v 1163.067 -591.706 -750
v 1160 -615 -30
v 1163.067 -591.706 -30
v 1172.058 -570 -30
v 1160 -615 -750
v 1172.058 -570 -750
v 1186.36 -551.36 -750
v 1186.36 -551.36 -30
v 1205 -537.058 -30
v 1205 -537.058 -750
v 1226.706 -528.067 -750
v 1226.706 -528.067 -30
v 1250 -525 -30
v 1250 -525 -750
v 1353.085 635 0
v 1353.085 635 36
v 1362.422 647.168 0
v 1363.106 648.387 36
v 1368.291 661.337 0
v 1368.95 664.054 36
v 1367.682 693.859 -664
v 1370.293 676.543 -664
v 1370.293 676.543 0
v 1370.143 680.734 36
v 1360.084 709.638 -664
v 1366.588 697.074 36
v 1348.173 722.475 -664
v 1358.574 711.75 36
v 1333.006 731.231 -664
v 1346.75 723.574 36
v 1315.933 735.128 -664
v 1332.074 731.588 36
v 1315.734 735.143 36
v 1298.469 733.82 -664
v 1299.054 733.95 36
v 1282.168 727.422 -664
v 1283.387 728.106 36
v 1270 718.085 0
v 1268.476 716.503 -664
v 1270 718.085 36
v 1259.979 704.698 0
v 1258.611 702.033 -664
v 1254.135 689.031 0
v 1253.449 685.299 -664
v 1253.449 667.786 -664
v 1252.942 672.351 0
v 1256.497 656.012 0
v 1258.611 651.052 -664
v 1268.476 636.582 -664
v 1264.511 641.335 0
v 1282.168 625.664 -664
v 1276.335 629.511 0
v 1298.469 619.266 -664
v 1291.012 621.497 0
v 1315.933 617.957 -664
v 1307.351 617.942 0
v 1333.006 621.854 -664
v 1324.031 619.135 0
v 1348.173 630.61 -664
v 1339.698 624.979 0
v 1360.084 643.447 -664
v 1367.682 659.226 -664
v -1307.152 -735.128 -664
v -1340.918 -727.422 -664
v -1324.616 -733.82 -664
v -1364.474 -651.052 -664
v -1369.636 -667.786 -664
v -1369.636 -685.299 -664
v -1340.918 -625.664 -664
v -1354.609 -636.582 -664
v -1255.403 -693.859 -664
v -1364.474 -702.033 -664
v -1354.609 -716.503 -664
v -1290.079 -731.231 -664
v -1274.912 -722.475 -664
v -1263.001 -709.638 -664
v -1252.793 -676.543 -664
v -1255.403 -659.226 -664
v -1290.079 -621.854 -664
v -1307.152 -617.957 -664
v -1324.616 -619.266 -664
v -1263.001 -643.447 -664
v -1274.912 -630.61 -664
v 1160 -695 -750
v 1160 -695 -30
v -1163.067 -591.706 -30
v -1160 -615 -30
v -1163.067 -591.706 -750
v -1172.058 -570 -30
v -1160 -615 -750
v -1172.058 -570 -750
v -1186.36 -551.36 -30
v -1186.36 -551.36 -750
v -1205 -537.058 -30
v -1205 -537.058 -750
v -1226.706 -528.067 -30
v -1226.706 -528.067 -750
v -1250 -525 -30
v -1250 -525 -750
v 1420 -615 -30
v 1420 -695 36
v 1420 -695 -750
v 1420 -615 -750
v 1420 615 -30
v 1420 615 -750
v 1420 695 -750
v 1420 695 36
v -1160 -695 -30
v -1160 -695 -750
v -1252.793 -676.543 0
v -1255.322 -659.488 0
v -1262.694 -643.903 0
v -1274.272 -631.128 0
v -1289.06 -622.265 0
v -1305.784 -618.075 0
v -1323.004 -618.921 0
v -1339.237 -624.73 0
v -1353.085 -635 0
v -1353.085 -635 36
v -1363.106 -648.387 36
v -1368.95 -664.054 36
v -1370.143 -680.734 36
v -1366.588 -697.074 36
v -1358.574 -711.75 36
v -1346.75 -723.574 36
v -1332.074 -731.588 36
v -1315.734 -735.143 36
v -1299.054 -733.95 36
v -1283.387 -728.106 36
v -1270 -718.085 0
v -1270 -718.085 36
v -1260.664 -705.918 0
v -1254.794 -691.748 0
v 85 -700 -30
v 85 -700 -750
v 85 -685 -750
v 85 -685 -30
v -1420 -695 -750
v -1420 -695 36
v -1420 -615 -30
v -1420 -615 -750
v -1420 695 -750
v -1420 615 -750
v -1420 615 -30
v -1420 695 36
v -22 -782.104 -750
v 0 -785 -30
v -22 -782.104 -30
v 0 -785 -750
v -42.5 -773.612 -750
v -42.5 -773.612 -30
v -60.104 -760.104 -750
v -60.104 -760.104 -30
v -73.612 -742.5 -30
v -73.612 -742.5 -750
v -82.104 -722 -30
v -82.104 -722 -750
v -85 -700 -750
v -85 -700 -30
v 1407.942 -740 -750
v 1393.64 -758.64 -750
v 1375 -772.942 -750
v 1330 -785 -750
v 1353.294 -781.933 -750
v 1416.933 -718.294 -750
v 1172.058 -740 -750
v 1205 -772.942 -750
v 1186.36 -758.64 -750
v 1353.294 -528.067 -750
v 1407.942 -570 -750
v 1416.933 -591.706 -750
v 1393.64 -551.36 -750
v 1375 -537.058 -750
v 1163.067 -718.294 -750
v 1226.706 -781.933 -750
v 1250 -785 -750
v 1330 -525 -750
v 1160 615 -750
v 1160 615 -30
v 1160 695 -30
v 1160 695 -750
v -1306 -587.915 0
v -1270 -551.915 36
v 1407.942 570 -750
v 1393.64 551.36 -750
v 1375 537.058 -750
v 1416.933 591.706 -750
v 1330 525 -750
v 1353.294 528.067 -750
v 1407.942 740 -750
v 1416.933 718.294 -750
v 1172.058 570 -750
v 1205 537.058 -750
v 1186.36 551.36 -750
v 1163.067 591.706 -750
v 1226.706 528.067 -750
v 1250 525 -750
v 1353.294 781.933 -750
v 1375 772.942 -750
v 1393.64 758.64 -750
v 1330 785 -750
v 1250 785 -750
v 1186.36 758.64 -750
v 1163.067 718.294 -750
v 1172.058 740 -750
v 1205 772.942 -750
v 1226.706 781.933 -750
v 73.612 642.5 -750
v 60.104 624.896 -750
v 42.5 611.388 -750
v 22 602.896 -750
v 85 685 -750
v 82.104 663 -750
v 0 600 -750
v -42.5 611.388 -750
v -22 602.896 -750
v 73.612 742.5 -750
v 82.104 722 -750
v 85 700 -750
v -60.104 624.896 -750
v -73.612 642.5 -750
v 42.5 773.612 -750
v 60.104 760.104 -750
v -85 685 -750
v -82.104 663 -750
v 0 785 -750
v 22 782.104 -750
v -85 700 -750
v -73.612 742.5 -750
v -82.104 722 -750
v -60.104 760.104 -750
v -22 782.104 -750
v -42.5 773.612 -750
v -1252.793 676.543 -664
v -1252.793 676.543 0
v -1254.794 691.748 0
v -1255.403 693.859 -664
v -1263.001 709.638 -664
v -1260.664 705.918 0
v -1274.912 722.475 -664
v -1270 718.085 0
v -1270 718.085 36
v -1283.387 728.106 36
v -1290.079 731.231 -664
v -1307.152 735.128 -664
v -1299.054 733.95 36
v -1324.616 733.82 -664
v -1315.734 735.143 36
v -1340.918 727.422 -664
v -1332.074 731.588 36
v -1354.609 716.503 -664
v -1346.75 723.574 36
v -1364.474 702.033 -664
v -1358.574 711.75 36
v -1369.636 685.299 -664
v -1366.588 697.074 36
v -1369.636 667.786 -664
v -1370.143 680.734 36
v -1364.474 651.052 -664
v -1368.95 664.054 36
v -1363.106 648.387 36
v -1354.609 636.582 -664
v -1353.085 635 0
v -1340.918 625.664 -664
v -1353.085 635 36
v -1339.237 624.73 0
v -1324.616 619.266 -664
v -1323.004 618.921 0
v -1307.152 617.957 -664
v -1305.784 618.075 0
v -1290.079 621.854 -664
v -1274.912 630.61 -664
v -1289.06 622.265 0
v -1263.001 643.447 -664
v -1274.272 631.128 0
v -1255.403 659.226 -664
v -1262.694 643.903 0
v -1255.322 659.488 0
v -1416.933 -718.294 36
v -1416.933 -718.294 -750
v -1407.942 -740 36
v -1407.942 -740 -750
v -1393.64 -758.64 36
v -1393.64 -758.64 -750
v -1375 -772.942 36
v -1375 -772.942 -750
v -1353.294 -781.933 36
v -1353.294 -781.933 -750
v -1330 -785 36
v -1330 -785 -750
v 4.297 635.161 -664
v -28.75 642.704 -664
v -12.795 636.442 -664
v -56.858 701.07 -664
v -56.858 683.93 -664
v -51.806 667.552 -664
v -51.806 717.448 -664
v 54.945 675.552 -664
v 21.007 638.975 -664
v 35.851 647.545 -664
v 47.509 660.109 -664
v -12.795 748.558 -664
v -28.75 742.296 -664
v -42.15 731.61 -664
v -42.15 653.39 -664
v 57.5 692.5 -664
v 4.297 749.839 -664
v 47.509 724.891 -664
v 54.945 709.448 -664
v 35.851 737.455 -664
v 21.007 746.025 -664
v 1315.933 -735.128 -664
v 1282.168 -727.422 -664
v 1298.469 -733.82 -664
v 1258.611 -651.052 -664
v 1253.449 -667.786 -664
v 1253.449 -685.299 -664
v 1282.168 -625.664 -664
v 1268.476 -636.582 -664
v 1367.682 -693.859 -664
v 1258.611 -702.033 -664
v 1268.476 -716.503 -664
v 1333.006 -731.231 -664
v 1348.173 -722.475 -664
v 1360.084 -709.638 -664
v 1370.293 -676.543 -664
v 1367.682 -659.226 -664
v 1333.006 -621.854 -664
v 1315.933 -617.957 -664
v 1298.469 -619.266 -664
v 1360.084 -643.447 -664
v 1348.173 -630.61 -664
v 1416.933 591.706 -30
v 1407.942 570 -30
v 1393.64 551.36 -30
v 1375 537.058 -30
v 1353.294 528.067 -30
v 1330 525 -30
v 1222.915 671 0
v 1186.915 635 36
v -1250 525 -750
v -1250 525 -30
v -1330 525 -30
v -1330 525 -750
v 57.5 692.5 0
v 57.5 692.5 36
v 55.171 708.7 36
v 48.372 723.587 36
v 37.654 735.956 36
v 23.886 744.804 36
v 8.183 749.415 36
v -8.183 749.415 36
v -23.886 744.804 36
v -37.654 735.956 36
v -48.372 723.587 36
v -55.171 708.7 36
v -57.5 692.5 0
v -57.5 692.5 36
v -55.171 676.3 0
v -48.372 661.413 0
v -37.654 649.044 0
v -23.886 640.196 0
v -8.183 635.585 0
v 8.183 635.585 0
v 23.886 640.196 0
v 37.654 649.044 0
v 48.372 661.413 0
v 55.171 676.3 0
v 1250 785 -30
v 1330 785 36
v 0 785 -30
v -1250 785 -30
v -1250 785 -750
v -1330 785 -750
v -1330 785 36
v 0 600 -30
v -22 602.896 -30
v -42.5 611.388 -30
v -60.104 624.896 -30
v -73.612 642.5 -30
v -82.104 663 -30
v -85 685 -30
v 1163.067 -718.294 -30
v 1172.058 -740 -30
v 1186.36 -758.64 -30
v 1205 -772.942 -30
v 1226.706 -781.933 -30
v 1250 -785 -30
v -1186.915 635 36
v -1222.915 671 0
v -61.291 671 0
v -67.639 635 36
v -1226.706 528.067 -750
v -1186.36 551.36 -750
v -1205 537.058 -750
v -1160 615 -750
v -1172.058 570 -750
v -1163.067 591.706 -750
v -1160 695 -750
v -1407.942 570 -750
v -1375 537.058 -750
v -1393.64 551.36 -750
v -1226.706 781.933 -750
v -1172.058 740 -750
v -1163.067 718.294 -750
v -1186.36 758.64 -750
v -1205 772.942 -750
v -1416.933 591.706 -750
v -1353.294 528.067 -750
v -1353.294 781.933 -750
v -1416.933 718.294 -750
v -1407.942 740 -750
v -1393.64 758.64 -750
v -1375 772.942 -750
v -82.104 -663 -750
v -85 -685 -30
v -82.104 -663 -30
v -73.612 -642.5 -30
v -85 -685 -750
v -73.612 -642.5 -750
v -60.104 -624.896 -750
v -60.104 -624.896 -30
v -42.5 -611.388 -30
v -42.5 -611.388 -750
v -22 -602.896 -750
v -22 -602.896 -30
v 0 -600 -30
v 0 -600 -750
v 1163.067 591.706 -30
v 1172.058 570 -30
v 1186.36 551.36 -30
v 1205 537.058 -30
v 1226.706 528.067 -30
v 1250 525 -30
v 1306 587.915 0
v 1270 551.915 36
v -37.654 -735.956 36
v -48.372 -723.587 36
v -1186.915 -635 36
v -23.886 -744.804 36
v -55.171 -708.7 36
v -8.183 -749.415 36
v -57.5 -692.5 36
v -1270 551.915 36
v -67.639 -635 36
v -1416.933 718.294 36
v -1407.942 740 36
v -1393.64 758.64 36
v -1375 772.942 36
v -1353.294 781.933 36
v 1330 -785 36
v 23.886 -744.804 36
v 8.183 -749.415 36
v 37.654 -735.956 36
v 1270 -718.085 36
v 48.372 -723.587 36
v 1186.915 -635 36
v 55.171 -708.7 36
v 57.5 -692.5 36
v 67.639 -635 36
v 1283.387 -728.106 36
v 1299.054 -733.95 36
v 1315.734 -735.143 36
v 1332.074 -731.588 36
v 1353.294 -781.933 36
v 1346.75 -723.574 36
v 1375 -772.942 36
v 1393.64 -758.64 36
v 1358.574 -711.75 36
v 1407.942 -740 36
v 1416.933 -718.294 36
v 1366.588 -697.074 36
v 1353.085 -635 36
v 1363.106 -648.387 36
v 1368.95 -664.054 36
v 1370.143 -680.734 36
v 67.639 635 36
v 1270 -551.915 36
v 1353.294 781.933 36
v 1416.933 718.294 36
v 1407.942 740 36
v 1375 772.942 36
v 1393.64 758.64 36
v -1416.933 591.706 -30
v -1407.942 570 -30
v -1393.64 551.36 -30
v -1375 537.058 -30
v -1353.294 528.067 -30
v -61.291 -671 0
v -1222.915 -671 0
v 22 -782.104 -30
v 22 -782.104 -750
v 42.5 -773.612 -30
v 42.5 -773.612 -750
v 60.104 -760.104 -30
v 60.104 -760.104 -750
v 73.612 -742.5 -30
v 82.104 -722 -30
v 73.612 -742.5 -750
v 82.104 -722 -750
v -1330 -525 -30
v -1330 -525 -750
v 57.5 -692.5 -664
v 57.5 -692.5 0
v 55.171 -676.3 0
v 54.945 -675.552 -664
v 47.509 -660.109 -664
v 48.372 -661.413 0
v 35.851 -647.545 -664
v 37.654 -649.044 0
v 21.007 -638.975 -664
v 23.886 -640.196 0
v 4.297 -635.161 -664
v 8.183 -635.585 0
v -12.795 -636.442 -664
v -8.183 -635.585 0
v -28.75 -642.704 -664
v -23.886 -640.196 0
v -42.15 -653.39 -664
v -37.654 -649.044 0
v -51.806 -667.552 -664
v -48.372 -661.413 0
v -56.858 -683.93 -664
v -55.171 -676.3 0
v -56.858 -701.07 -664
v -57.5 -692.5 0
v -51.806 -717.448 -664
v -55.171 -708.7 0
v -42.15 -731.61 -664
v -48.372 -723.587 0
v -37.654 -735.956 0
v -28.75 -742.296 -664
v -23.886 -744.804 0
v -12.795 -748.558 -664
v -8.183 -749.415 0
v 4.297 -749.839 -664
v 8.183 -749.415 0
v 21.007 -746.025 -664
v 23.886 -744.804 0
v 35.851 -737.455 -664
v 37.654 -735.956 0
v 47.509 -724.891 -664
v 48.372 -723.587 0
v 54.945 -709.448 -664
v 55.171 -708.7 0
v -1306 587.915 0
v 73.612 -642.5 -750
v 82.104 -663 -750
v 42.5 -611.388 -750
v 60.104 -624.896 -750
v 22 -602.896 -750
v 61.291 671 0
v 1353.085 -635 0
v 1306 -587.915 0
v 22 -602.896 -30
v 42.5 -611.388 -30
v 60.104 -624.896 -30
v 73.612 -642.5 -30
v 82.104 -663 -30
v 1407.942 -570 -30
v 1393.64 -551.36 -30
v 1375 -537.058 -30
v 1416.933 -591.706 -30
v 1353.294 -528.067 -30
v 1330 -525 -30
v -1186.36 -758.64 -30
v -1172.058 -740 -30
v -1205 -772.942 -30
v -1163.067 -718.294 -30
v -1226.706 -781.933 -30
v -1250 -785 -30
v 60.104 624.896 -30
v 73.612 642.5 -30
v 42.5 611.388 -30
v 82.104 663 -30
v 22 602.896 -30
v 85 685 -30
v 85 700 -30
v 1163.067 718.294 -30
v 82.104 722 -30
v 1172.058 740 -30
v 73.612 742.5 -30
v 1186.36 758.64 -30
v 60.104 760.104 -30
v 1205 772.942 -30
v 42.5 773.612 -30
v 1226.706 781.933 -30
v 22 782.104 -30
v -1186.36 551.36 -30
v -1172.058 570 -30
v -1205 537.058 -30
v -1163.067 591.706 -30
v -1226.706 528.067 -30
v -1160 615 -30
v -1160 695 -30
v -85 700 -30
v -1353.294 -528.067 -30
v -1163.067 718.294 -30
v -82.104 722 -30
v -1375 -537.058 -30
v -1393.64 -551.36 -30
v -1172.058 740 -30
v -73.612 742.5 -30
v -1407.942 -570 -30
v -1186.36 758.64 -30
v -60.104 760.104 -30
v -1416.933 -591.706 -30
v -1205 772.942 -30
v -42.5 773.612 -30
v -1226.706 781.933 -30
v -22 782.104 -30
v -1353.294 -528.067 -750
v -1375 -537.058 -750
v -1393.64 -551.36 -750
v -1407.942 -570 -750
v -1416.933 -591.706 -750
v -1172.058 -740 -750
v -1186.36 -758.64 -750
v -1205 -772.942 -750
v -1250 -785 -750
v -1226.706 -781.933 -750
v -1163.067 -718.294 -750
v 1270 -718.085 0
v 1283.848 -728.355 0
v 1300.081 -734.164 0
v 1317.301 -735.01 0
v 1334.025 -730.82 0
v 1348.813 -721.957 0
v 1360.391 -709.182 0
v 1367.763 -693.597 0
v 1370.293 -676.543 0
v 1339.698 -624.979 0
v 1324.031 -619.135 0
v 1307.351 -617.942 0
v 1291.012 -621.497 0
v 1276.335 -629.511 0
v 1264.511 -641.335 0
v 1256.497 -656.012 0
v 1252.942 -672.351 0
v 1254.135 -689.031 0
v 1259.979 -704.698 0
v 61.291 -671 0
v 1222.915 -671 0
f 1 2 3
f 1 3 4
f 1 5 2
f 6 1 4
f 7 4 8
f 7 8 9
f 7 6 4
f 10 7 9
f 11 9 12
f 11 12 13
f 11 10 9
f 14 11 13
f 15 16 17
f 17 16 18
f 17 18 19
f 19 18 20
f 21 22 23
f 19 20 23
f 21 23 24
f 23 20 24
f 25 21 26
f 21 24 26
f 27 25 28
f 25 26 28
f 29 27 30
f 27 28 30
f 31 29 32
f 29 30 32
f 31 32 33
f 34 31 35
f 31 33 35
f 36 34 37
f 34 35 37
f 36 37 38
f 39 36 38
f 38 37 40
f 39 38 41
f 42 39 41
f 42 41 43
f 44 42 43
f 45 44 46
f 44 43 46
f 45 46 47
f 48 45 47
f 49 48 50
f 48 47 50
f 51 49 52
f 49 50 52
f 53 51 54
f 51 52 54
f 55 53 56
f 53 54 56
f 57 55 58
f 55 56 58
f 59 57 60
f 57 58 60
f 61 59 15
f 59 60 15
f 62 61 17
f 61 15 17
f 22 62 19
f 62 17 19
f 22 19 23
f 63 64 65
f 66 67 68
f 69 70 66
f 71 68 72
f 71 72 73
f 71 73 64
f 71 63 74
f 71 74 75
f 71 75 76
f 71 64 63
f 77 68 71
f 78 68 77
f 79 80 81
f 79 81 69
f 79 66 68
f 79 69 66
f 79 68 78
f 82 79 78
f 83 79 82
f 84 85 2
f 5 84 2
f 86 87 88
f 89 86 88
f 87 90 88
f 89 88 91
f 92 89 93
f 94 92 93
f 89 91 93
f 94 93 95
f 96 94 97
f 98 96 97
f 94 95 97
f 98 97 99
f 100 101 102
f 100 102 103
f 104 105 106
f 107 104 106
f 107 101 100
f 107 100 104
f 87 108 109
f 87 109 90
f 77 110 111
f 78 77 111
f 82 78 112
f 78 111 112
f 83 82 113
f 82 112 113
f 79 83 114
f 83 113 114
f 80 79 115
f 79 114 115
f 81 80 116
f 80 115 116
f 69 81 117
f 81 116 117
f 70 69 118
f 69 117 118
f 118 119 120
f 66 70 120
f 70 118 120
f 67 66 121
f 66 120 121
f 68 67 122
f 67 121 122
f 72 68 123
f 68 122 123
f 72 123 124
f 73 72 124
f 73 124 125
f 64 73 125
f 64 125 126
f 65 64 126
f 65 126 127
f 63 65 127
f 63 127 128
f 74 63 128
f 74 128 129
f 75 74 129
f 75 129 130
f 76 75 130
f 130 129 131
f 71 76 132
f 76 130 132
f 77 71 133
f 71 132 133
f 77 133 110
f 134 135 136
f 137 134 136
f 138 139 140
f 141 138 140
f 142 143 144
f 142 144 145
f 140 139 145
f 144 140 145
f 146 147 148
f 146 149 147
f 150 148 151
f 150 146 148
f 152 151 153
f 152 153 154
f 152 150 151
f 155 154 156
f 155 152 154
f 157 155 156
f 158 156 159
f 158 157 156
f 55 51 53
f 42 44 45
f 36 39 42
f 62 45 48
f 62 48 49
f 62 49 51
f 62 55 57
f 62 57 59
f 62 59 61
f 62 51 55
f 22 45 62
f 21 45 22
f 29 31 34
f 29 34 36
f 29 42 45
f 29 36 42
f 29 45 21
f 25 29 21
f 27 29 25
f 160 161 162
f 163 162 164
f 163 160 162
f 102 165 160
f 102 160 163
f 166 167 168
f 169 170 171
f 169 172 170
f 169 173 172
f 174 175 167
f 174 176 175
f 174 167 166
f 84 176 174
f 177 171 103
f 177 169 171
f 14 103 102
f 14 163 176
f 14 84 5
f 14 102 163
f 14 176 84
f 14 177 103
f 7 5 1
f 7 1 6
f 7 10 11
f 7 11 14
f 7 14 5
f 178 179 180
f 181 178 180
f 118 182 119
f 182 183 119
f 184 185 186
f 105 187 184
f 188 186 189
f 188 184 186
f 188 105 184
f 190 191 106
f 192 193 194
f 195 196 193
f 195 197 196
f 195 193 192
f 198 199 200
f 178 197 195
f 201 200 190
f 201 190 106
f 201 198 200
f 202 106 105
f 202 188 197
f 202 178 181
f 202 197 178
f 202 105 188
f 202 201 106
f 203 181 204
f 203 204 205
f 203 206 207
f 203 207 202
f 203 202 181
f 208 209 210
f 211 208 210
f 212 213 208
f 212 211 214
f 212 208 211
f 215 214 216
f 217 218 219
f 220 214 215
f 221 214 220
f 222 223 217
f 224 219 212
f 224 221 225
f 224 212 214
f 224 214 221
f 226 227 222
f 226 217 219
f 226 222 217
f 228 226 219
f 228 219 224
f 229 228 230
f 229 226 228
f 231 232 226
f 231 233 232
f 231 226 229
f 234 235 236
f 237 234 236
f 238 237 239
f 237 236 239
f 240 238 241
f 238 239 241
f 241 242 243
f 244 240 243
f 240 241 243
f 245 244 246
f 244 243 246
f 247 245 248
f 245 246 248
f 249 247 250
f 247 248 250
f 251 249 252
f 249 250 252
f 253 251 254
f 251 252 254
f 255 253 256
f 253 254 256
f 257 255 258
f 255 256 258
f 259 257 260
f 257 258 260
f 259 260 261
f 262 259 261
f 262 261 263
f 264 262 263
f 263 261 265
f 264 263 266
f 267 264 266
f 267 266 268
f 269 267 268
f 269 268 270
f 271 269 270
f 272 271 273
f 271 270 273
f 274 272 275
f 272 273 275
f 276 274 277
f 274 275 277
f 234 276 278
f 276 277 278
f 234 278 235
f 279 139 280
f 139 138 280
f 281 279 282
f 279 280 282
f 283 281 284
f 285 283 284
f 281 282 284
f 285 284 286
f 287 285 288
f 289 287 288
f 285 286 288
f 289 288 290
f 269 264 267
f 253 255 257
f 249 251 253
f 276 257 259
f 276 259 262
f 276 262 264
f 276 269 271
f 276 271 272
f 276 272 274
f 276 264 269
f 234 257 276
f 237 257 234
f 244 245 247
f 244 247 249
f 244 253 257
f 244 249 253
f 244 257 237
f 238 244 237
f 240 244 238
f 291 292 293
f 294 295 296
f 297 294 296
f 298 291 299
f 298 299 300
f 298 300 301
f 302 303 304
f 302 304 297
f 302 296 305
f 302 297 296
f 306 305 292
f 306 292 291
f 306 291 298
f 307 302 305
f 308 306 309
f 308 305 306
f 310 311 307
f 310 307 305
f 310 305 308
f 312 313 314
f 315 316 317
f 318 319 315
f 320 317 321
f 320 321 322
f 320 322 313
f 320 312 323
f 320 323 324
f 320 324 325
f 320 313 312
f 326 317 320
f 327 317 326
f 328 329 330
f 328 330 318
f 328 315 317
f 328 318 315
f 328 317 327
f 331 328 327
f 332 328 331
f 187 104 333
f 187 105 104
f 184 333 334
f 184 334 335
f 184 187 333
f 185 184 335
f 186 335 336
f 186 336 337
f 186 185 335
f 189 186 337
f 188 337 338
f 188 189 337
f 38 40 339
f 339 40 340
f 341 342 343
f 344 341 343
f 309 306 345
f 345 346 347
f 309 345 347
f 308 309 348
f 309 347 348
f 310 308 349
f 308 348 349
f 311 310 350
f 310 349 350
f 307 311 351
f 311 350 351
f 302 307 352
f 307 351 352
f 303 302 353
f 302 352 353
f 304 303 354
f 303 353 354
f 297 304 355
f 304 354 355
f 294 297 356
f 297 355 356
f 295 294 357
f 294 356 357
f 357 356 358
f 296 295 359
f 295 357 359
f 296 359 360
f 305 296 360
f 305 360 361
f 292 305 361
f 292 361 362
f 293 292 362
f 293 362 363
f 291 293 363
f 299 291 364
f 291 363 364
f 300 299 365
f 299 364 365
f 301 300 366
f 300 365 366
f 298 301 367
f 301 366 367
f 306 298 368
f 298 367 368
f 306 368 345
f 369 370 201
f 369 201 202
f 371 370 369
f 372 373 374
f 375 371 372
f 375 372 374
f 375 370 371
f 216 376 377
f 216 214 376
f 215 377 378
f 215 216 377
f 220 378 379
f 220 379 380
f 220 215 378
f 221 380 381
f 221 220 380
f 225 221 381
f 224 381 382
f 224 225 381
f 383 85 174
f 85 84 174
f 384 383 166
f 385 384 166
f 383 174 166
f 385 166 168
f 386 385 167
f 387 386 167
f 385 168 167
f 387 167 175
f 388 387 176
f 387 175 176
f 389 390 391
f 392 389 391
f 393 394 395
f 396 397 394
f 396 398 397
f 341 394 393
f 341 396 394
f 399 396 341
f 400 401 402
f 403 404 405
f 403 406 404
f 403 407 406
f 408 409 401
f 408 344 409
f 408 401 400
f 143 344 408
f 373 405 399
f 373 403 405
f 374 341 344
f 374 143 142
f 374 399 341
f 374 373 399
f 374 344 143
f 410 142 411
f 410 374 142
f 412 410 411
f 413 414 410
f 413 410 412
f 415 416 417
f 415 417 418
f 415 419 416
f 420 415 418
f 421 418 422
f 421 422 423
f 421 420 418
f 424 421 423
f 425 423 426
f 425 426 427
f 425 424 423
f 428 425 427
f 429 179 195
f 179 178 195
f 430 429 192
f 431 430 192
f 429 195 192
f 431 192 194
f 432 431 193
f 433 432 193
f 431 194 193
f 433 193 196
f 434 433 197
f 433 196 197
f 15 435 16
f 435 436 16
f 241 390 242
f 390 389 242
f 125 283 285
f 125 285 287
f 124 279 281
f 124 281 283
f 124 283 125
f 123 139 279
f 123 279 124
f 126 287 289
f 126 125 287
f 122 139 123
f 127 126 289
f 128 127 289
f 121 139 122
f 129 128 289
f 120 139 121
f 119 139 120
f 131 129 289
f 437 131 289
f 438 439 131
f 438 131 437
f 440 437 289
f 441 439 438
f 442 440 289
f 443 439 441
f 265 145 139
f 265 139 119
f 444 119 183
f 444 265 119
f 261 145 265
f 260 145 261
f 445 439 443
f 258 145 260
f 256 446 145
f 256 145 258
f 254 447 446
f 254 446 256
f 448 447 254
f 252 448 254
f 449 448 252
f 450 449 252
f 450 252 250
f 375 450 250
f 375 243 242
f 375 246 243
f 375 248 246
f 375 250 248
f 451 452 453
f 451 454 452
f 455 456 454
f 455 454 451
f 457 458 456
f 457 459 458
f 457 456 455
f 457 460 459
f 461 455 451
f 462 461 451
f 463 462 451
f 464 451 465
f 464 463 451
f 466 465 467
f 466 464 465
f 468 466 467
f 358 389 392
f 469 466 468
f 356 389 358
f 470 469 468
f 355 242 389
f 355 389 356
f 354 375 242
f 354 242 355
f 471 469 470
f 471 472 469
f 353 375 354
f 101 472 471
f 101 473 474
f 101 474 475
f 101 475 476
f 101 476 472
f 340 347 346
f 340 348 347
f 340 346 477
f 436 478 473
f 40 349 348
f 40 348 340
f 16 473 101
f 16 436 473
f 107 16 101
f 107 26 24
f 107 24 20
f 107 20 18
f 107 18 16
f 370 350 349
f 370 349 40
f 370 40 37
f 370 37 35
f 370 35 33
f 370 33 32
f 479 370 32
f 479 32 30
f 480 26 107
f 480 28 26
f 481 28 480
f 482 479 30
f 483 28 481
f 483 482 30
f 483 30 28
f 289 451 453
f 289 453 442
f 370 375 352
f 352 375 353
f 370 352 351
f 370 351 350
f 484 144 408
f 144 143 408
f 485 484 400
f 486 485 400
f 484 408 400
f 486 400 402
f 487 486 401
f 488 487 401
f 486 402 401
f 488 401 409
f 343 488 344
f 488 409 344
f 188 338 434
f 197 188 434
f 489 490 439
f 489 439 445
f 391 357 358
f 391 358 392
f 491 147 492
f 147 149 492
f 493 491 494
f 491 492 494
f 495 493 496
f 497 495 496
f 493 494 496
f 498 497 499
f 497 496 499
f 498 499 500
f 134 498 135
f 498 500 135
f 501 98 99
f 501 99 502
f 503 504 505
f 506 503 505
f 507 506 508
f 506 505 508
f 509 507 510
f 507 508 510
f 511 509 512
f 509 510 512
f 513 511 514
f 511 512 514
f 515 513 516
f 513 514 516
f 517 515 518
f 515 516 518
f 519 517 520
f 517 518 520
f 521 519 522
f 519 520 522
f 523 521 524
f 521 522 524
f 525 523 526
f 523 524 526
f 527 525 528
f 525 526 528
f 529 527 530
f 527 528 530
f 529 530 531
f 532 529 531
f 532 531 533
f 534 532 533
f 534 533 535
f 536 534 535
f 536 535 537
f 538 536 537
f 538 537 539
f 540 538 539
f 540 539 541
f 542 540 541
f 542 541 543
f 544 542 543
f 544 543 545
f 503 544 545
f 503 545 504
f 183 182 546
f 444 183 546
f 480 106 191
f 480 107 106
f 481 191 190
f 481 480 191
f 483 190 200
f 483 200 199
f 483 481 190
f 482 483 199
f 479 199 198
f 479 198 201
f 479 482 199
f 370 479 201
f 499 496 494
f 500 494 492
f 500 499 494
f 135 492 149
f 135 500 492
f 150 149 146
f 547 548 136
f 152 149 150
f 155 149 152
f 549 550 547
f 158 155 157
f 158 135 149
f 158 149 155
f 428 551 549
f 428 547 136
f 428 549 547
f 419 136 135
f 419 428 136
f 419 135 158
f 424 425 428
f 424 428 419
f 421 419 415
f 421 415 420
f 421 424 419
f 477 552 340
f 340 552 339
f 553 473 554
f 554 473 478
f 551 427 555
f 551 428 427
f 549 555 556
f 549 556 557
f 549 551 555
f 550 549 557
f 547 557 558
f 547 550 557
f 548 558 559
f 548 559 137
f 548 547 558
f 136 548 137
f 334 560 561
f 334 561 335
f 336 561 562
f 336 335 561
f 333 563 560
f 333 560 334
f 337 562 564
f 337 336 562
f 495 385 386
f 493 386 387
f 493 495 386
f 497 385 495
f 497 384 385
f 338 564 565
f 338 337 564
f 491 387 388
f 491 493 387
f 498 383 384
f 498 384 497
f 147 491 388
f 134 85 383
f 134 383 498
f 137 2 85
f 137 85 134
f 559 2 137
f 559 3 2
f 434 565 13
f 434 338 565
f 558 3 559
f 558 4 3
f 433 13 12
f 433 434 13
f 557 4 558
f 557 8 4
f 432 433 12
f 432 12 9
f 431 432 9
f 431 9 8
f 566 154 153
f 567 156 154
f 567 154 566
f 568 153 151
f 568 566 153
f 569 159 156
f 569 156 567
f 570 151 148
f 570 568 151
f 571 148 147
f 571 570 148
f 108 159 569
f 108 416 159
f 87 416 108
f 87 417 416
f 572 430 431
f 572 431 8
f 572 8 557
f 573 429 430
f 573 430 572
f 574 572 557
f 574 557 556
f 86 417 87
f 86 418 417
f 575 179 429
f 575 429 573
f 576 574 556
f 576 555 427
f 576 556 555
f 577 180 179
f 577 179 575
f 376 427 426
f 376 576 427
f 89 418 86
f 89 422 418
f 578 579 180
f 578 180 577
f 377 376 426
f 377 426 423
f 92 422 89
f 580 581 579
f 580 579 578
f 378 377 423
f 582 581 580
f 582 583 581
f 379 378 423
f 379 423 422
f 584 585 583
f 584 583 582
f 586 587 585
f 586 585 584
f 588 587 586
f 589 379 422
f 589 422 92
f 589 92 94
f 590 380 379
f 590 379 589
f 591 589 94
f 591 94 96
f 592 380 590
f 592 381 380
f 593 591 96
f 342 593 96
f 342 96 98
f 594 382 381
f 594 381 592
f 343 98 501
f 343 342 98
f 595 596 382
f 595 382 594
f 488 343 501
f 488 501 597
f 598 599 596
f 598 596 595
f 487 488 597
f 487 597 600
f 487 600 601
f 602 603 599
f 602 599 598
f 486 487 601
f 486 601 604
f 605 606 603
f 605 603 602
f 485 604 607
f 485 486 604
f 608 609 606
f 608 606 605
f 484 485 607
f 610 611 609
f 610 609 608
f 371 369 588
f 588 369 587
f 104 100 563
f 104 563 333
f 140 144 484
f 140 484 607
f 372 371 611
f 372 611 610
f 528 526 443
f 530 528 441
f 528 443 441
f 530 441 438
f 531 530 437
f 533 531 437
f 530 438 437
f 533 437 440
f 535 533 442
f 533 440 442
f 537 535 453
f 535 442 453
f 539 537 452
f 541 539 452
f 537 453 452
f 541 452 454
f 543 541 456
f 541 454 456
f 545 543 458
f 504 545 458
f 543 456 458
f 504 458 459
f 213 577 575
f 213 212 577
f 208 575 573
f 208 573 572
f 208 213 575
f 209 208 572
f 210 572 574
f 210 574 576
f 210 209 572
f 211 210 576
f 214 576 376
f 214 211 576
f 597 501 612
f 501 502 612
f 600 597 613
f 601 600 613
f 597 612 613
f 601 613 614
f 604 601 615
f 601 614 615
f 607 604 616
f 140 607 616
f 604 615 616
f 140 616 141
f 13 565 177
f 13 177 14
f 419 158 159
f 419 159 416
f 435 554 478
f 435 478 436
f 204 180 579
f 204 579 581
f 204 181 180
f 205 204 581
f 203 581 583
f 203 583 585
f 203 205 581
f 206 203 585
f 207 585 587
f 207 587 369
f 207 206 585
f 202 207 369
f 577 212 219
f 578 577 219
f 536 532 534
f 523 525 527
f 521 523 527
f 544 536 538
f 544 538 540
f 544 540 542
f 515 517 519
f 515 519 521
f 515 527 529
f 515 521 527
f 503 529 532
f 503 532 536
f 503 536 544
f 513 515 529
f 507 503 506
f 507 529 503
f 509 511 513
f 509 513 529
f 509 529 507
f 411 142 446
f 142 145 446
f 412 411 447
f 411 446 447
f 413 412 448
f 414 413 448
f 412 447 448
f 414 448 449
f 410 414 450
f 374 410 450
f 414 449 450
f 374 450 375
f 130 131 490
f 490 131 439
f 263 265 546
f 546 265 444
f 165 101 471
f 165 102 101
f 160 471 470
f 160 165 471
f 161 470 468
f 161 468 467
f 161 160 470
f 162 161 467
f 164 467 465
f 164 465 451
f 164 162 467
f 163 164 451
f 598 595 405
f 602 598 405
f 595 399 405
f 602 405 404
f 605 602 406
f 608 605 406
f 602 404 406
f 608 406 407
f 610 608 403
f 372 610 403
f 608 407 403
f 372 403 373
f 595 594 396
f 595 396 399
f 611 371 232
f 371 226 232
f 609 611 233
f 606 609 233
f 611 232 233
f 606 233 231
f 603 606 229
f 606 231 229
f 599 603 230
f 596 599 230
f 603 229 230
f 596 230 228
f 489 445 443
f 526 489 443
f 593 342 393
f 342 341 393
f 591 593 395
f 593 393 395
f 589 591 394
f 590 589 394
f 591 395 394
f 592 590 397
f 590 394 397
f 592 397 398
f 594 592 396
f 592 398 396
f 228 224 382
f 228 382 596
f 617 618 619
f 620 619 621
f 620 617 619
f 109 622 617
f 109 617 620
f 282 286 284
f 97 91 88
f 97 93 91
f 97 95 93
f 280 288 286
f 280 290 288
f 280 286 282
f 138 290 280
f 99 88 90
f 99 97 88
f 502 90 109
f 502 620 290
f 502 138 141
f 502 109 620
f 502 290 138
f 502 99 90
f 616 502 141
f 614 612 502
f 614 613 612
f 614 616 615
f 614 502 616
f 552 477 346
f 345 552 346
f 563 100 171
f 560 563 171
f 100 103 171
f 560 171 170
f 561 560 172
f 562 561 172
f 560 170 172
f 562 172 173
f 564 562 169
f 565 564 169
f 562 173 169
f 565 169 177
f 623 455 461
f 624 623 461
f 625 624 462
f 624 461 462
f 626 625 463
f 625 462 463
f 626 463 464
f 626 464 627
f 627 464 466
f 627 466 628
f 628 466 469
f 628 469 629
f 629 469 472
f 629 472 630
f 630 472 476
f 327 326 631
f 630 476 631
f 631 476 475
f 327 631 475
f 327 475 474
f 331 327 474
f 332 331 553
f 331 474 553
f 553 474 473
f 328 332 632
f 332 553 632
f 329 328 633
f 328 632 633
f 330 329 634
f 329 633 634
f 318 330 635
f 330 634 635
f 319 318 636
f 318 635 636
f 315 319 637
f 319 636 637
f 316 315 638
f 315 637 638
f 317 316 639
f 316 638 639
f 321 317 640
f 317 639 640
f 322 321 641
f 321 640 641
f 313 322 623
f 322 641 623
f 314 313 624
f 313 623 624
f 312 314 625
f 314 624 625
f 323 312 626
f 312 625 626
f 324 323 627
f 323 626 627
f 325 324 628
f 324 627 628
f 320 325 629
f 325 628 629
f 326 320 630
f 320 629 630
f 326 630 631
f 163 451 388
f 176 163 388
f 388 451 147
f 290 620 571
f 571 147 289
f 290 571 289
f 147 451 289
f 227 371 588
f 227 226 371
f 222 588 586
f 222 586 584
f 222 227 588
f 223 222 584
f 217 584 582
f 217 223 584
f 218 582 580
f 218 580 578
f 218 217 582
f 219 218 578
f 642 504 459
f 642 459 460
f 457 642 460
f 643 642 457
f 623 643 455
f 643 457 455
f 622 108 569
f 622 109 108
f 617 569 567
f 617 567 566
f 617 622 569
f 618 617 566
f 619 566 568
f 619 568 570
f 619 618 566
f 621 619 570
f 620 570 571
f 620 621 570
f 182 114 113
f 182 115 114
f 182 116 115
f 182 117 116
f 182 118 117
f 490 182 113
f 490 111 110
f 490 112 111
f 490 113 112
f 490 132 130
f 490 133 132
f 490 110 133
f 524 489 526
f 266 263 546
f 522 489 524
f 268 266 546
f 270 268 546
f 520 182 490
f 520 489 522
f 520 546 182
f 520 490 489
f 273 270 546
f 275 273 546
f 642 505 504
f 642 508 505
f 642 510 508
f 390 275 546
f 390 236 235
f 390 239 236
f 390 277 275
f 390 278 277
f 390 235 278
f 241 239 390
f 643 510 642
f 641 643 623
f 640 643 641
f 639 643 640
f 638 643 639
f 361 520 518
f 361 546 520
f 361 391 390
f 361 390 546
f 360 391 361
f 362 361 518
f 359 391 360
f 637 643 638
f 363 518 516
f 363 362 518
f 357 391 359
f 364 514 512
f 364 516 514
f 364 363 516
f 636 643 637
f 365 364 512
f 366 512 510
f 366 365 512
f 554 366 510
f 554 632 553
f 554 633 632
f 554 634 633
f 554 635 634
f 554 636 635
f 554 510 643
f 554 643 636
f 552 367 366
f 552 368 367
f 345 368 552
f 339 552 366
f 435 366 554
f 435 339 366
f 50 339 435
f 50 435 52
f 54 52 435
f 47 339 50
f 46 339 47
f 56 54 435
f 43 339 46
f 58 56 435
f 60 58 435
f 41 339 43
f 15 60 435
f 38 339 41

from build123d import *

# Parameters (mm, degrees)
SZKIC1_W                    = 2840
SZKIC1_H                    = 1570
SZKIC1_W_2                  = 2540
SZKIC1_H_2                  = 1270
DODANIE_WYCI_GNI_CIE1_DEPTH = 36
SFAZOWANIE1_SIZE            = 36
SZKIC3_W                    = 2840
SZKIC3_H                    = 1570
DODANIE_WYCI_GNI_CIE3_DEPTH = 30
SZKIC5_W                    = 260
SZKIC5_H                    = 260
DODANIE_WYCI_GNI_CIE4_DEPTH = 720
WYTNIJ_WYCI_GNI_CIE16_DEPTH = 36
SZKIC8_R                    = 58.75
WYTNIJ_WYCI_GNI_CIE17_DEPTH = 700
ZAOKR_GLENIE1_R             = 90
WYTNIJ_WYCI_GNI_CIE18_DEPTH = 36
SZKIC11_W                   = 170
SZKIC11_H                   = 185
DODANIE_WYCI_GNI_CIE5_DEPTH = 720
ZAOKR_GLENIE2_R             = 85
SZKIC10_R                   = 57.5
WYTNIJ_WYCI_GNI_CIE19_DEPTH = 700


with BuildPart() as part:
    # Szkic1 → Dodanie-wyciągnięcie1 (new body)
    with BuildSketch(Plane.XY):
        Rectangle(SZKIC1_W, SZKIC1_H)
        Rectangle(SZKIC1_W_2, SZKIC1_H_2, mode=Mode.SUBTRACT)
    extrude(amount=DODANIE_WYCI_GNI_CIE1_DEPTH)

    # Sfazowanie1
    sfazowanie1_edges = [part.edges().sort_by_distance(p)[0] for p in [
        (-1270, 0, 0),
        (0, -635, 0),
        (1270, 0, 0),
        (0, 635, 0),
    ]]
    chamfer(sfazowanie1_edges, length=SFAZOWANIE1_SIZE - 0.0001)  # a hair under: the kernel refuses the full size

    # Szkic3 → Dodanie-wyciągnięcie3 (add)
    with BuildSketch(Plane(origin=(0, 0, 0), x_dir=(-1, 0, 0), z_dir=(0, 0, -1))):
        Rectangle(SZKIC3_W, SZKIC3_H)
    extrude(amount=DODANIE_WYCI_GNI_CIE3_DEPTH)

    # Szkic5 → Dodanie-wyciągnięcie4 (add)
    with BuildSketch(Plane(origin=(0, 0, -30), x_dir=(-1, 0, 0), z_dir=(0, 0, -1))):
        with Locations((-1290, 655)):
            Rectangle(SZKIC5_W, SZKIC5_H)
        with Locations((1290, 655)):
            Rectangle(SZKIC5_W, SZKIC5_H)
        with Locations((1290, -655)):
            Rectangle(SZKIC5_W, SZKIC5_H)
        with Locations((-1290, -655)):
            Rectangle(SZKIC5_W, SZKIC5_H)
    extrude(amount=DODANIE_WYCI_GNI_CIE4_DEPTH)

    # Szkic4 → Wytnij-wyciągnięcie16 (cut)
    with BuildSketch(Plane.XY.offset(36)):
        with BuildLine():
            Line((-1270, 635), (-1186.914953211, 635))
            Line((-1186.914953211, 635), (-1270, 718.085046789))
            ThreePointArc((-1270, 718.085046789), (-1353.085046789, 718.085046789), (-1353.085046789, 635))
            Line((-1353.085046789, 635), (-1270, 551.914953211))
            Line((-1270, 551.914953211), (-1270, 635))
        make_face()
        with BuildLine():
            Line((1270, 718.085046789), (1186.914953211, 635))
            Line((1186.914953211, 635), (1270, 635))
            Line((1270, 635), (1270, 551.914953211))
            Line((1270, 551.914953211), (1353.085046789, 635))
            ThreePointArc((1353.085046789, 635), (1353.085046789, 718.085046789), (1270, 718.085046789))
        make_face()
        with BuildLine():
            Line((-1270, -635), (-1270, -551.914953211))
            Line((-1270, -551.914953211), (-1353.085046789, -635))
            ThreePointArc((-1353.085046789, -635), (-1353.085046789, -718.085046789), (-1270, -718.085046789))
            Line((-1270, -718.085046789), (-1186.914953211, -635))
            Line((-1186.914953211, -635), (-1270, -635))
        make_face()
        with BuildLine():
            Line((1353.085046789, -635), (1270, -551.914953211))
            Line((1270, -551.914953211), (1270, -635))
            Line((1270, -635), (1186.914953211, -635))
            Line((1186.914953211, -635), (1270, -718.085046789))
            ThreePointArc((1270, -718.085046789), (1353.085046789, -718.085046789), (1353.085046789, -635))
        make_face()
    extrude(amount=-WYTNIJ_WYCI_GNI_CIE16_DEPTH, mode=Mode.SUBTRACT)

    # Szkic8 → Wytnij-wyciągnięcie17 (cut)
    with BuildSketch(Plane.XY.offset(36)):
        with Locations((-1311.542523395, -676.542523395)):
            Circle(SZKIC8_R)
        with Locations((-1311.542523395, 676.542523395)):
            Circle(SZKIC8_R)
        with Locations((1311.542523395, 676.542523395)):
            Circle(SZKIC8_R)
        with Locations((1311.542523395, -676.542523395)):
            Circle(SZKIC8_R)
    extrude(amount=-WYTNIJ_WYCI_GNI_CIE17_DEPTH, mode=Mode.SUBTRACT)

    # Zaokrąglenie1
    zaokr_glenie1_edges = [part.edges().sort_by_distance(p)[0] for p in [
        (-1160, 525, -390),
        (-1160, -785, -390),
        (-1420, -785, -357),
        (-1160, -525, -390),
        (-1420, -525, -390),
        (-1420, 525, -390),
        (-1160, 785, -390),
        (-1420, 785, -357),
        (1160, -525, -390),
        (1420, -525, -390),
        (1420, -785, -357),
        (1160, -785, -390),
        (1160, 525, -390),
        (1160, 785, -390),
        (1420, 525, -390),
        (1420, 785, -357),
    ]]
    fillet(zaokr_glenie1_edges, radius=ZAOKR_GLENIE1_R)

    # Szkic9 → Wytnij-wyciągnięcie18 (cut)
    with BuildSketch(Plane.XY.offset(36)):
        with BuildLine():
            Line((-67.638801391, 635), (67.638801391, 635))
            Line((67.638801391, 635), (57.5, 692.5))
            ThreePointArc((57.5, 692.5), (0, 750), (-57.5, 692.5))
            Line((-57.5, 692.5), (-67.638801391, 635))
        make_face()
        with BuildLine():
            Line((-67.638801391, -635), (-57.5, -692.5))
            ThreePointArc((-57.5, -692.5), (0, -750), (57.5, -692.5))
            Line((57.5, -692.5), (67.638801391, -635))
            Line((67.638801391, -635), (-67.638801391, -635))
        make_face()
    extrude(amount=-WYTNIJ_WYCI_GNI_CIE18_DEPTH, mode=Mode.SUBTRACT)

    # Szkic11 → Dodanie-wyciągnięcie5 (add)
    with BuildSketch(Plane(origin=(0, 0, -30), x_dir=(-1, 0, 0), z_dir=(0, 0, -1))):
        with Locations((0, 692.5)):
            Rectangle(SZKIC11_W, SZKIC11_H)
        with Locations((0, -692.5)):
            Rectangle(SZKIC11_W, SZKIC11_H)
    extrude(amount=DODANIE_WYCI_GNI_CIE5_DEPTH)

    # Zaokrąglenie2
    zaokr_glenie2_edges = [part.edges().sort_by_distance(p)[0] for p in [
        (85, -785, -390),
        (85, -600, -390),
        (-85, -600, -390),
        (-85, -785, -390),
        (-85, 600, -390),
        (85, 600, -390),
        (85, 785, -390),
        (-85, 785, -390),
    ]]
    fillet(zaokr_glenie2_edges, radius=ZAOKR_GLENIE2_R - 0.0001)  # a hair under: the kernel refuses the full size

    # Szkic10 → Wytnij-wyciągnięcie19 (cut)
    with BuildSketch(Plane.XY.offset(36)):
        with Locations((0, 692.5)):
            Circle(SZKIC10_R)
        with Locations((0, -692.5)):
            Circle(SZKIC10_R)
    extrude(amount=-WYTNIJ_WYCI_GNI_CIE19_DEPTH, mode=Mode.SUBTRACT)


solid = part.part
